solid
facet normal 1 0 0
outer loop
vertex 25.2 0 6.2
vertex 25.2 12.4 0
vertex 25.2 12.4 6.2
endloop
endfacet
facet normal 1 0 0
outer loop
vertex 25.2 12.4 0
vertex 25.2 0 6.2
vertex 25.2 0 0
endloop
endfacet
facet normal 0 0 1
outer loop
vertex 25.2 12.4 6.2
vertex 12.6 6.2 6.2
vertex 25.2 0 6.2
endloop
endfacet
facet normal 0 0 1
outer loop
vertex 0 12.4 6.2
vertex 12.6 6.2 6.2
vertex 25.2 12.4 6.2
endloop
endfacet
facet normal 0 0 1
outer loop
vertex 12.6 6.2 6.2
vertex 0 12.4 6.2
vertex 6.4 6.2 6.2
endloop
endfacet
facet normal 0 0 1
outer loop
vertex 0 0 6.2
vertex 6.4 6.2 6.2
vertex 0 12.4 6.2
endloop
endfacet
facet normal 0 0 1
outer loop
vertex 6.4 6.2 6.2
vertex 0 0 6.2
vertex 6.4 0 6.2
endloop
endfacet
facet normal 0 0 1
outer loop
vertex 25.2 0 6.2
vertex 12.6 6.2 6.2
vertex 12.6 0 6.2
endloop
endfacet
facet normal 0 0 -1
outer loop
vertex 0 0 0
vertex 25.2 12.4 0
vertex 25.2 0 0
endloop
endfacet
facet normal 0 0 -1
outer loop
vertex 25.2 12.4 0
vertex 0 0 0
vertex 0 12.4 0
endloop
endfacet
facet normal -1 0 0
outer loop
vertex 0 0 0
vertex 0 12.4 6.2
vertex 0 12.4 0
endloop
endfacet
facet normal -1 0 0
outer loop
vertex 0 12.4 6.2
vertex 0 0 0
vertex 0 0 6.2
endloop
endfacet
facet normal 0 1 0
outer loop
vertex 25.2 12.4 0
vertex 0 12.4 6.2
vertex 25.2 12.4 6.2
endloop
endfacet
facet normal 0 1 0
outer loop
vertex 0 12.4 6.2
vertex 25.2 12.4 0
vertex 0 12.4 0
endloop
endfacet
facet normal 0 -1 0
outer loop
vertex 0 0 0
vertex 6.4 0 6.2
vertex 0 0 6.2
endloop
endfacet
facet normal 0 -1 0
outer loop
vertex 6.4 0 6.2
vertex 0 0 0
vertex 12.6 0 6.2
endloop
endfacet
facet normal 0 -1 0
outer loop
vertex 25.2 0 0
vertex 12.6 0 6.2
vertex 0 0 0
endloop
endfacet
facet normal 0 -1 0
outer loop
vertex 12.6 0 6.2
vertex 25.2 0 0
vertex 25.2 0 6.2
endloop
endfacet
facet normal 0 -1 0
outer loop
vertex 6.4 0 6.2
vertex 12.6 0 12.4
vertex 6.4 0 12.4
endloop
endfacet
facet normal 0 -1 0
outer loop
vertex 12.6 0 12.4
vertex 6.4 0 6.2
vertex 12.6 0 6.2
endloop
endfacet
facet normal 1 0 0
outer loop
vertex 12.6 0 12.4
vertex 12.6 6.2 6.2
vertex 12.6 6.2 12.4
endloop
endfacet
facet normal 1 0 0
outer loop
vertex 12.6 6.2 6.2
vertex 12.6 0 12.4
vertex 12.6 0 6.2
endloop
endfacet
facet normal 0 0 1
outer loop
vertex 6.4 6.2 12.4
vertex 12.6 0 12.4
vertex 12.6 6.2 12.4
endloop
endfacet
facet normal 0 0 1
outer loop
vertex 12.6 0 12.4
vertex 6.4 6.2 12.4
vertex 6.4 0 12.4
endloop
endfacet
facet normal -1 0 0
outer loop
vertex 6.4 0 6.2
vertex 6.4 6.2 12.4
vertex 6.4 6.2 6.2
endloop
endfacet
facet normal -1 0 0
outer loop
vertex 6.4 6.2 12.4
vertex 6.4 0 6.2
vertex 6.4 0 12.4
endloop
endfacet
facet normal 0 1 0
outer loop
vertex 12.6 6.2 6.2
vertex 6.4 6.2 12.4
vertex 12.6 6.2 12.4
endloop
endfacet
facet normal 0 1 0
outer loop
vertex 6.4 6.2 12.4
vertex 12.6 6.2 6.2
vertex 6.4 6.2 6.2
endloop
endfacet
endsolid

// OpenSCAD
cube([25.2, 12.4, 6.2]);

translate([(25.2/2) - 6.2, 0, 6.2])
	cube([6.2, 6.2, 6.2]);
